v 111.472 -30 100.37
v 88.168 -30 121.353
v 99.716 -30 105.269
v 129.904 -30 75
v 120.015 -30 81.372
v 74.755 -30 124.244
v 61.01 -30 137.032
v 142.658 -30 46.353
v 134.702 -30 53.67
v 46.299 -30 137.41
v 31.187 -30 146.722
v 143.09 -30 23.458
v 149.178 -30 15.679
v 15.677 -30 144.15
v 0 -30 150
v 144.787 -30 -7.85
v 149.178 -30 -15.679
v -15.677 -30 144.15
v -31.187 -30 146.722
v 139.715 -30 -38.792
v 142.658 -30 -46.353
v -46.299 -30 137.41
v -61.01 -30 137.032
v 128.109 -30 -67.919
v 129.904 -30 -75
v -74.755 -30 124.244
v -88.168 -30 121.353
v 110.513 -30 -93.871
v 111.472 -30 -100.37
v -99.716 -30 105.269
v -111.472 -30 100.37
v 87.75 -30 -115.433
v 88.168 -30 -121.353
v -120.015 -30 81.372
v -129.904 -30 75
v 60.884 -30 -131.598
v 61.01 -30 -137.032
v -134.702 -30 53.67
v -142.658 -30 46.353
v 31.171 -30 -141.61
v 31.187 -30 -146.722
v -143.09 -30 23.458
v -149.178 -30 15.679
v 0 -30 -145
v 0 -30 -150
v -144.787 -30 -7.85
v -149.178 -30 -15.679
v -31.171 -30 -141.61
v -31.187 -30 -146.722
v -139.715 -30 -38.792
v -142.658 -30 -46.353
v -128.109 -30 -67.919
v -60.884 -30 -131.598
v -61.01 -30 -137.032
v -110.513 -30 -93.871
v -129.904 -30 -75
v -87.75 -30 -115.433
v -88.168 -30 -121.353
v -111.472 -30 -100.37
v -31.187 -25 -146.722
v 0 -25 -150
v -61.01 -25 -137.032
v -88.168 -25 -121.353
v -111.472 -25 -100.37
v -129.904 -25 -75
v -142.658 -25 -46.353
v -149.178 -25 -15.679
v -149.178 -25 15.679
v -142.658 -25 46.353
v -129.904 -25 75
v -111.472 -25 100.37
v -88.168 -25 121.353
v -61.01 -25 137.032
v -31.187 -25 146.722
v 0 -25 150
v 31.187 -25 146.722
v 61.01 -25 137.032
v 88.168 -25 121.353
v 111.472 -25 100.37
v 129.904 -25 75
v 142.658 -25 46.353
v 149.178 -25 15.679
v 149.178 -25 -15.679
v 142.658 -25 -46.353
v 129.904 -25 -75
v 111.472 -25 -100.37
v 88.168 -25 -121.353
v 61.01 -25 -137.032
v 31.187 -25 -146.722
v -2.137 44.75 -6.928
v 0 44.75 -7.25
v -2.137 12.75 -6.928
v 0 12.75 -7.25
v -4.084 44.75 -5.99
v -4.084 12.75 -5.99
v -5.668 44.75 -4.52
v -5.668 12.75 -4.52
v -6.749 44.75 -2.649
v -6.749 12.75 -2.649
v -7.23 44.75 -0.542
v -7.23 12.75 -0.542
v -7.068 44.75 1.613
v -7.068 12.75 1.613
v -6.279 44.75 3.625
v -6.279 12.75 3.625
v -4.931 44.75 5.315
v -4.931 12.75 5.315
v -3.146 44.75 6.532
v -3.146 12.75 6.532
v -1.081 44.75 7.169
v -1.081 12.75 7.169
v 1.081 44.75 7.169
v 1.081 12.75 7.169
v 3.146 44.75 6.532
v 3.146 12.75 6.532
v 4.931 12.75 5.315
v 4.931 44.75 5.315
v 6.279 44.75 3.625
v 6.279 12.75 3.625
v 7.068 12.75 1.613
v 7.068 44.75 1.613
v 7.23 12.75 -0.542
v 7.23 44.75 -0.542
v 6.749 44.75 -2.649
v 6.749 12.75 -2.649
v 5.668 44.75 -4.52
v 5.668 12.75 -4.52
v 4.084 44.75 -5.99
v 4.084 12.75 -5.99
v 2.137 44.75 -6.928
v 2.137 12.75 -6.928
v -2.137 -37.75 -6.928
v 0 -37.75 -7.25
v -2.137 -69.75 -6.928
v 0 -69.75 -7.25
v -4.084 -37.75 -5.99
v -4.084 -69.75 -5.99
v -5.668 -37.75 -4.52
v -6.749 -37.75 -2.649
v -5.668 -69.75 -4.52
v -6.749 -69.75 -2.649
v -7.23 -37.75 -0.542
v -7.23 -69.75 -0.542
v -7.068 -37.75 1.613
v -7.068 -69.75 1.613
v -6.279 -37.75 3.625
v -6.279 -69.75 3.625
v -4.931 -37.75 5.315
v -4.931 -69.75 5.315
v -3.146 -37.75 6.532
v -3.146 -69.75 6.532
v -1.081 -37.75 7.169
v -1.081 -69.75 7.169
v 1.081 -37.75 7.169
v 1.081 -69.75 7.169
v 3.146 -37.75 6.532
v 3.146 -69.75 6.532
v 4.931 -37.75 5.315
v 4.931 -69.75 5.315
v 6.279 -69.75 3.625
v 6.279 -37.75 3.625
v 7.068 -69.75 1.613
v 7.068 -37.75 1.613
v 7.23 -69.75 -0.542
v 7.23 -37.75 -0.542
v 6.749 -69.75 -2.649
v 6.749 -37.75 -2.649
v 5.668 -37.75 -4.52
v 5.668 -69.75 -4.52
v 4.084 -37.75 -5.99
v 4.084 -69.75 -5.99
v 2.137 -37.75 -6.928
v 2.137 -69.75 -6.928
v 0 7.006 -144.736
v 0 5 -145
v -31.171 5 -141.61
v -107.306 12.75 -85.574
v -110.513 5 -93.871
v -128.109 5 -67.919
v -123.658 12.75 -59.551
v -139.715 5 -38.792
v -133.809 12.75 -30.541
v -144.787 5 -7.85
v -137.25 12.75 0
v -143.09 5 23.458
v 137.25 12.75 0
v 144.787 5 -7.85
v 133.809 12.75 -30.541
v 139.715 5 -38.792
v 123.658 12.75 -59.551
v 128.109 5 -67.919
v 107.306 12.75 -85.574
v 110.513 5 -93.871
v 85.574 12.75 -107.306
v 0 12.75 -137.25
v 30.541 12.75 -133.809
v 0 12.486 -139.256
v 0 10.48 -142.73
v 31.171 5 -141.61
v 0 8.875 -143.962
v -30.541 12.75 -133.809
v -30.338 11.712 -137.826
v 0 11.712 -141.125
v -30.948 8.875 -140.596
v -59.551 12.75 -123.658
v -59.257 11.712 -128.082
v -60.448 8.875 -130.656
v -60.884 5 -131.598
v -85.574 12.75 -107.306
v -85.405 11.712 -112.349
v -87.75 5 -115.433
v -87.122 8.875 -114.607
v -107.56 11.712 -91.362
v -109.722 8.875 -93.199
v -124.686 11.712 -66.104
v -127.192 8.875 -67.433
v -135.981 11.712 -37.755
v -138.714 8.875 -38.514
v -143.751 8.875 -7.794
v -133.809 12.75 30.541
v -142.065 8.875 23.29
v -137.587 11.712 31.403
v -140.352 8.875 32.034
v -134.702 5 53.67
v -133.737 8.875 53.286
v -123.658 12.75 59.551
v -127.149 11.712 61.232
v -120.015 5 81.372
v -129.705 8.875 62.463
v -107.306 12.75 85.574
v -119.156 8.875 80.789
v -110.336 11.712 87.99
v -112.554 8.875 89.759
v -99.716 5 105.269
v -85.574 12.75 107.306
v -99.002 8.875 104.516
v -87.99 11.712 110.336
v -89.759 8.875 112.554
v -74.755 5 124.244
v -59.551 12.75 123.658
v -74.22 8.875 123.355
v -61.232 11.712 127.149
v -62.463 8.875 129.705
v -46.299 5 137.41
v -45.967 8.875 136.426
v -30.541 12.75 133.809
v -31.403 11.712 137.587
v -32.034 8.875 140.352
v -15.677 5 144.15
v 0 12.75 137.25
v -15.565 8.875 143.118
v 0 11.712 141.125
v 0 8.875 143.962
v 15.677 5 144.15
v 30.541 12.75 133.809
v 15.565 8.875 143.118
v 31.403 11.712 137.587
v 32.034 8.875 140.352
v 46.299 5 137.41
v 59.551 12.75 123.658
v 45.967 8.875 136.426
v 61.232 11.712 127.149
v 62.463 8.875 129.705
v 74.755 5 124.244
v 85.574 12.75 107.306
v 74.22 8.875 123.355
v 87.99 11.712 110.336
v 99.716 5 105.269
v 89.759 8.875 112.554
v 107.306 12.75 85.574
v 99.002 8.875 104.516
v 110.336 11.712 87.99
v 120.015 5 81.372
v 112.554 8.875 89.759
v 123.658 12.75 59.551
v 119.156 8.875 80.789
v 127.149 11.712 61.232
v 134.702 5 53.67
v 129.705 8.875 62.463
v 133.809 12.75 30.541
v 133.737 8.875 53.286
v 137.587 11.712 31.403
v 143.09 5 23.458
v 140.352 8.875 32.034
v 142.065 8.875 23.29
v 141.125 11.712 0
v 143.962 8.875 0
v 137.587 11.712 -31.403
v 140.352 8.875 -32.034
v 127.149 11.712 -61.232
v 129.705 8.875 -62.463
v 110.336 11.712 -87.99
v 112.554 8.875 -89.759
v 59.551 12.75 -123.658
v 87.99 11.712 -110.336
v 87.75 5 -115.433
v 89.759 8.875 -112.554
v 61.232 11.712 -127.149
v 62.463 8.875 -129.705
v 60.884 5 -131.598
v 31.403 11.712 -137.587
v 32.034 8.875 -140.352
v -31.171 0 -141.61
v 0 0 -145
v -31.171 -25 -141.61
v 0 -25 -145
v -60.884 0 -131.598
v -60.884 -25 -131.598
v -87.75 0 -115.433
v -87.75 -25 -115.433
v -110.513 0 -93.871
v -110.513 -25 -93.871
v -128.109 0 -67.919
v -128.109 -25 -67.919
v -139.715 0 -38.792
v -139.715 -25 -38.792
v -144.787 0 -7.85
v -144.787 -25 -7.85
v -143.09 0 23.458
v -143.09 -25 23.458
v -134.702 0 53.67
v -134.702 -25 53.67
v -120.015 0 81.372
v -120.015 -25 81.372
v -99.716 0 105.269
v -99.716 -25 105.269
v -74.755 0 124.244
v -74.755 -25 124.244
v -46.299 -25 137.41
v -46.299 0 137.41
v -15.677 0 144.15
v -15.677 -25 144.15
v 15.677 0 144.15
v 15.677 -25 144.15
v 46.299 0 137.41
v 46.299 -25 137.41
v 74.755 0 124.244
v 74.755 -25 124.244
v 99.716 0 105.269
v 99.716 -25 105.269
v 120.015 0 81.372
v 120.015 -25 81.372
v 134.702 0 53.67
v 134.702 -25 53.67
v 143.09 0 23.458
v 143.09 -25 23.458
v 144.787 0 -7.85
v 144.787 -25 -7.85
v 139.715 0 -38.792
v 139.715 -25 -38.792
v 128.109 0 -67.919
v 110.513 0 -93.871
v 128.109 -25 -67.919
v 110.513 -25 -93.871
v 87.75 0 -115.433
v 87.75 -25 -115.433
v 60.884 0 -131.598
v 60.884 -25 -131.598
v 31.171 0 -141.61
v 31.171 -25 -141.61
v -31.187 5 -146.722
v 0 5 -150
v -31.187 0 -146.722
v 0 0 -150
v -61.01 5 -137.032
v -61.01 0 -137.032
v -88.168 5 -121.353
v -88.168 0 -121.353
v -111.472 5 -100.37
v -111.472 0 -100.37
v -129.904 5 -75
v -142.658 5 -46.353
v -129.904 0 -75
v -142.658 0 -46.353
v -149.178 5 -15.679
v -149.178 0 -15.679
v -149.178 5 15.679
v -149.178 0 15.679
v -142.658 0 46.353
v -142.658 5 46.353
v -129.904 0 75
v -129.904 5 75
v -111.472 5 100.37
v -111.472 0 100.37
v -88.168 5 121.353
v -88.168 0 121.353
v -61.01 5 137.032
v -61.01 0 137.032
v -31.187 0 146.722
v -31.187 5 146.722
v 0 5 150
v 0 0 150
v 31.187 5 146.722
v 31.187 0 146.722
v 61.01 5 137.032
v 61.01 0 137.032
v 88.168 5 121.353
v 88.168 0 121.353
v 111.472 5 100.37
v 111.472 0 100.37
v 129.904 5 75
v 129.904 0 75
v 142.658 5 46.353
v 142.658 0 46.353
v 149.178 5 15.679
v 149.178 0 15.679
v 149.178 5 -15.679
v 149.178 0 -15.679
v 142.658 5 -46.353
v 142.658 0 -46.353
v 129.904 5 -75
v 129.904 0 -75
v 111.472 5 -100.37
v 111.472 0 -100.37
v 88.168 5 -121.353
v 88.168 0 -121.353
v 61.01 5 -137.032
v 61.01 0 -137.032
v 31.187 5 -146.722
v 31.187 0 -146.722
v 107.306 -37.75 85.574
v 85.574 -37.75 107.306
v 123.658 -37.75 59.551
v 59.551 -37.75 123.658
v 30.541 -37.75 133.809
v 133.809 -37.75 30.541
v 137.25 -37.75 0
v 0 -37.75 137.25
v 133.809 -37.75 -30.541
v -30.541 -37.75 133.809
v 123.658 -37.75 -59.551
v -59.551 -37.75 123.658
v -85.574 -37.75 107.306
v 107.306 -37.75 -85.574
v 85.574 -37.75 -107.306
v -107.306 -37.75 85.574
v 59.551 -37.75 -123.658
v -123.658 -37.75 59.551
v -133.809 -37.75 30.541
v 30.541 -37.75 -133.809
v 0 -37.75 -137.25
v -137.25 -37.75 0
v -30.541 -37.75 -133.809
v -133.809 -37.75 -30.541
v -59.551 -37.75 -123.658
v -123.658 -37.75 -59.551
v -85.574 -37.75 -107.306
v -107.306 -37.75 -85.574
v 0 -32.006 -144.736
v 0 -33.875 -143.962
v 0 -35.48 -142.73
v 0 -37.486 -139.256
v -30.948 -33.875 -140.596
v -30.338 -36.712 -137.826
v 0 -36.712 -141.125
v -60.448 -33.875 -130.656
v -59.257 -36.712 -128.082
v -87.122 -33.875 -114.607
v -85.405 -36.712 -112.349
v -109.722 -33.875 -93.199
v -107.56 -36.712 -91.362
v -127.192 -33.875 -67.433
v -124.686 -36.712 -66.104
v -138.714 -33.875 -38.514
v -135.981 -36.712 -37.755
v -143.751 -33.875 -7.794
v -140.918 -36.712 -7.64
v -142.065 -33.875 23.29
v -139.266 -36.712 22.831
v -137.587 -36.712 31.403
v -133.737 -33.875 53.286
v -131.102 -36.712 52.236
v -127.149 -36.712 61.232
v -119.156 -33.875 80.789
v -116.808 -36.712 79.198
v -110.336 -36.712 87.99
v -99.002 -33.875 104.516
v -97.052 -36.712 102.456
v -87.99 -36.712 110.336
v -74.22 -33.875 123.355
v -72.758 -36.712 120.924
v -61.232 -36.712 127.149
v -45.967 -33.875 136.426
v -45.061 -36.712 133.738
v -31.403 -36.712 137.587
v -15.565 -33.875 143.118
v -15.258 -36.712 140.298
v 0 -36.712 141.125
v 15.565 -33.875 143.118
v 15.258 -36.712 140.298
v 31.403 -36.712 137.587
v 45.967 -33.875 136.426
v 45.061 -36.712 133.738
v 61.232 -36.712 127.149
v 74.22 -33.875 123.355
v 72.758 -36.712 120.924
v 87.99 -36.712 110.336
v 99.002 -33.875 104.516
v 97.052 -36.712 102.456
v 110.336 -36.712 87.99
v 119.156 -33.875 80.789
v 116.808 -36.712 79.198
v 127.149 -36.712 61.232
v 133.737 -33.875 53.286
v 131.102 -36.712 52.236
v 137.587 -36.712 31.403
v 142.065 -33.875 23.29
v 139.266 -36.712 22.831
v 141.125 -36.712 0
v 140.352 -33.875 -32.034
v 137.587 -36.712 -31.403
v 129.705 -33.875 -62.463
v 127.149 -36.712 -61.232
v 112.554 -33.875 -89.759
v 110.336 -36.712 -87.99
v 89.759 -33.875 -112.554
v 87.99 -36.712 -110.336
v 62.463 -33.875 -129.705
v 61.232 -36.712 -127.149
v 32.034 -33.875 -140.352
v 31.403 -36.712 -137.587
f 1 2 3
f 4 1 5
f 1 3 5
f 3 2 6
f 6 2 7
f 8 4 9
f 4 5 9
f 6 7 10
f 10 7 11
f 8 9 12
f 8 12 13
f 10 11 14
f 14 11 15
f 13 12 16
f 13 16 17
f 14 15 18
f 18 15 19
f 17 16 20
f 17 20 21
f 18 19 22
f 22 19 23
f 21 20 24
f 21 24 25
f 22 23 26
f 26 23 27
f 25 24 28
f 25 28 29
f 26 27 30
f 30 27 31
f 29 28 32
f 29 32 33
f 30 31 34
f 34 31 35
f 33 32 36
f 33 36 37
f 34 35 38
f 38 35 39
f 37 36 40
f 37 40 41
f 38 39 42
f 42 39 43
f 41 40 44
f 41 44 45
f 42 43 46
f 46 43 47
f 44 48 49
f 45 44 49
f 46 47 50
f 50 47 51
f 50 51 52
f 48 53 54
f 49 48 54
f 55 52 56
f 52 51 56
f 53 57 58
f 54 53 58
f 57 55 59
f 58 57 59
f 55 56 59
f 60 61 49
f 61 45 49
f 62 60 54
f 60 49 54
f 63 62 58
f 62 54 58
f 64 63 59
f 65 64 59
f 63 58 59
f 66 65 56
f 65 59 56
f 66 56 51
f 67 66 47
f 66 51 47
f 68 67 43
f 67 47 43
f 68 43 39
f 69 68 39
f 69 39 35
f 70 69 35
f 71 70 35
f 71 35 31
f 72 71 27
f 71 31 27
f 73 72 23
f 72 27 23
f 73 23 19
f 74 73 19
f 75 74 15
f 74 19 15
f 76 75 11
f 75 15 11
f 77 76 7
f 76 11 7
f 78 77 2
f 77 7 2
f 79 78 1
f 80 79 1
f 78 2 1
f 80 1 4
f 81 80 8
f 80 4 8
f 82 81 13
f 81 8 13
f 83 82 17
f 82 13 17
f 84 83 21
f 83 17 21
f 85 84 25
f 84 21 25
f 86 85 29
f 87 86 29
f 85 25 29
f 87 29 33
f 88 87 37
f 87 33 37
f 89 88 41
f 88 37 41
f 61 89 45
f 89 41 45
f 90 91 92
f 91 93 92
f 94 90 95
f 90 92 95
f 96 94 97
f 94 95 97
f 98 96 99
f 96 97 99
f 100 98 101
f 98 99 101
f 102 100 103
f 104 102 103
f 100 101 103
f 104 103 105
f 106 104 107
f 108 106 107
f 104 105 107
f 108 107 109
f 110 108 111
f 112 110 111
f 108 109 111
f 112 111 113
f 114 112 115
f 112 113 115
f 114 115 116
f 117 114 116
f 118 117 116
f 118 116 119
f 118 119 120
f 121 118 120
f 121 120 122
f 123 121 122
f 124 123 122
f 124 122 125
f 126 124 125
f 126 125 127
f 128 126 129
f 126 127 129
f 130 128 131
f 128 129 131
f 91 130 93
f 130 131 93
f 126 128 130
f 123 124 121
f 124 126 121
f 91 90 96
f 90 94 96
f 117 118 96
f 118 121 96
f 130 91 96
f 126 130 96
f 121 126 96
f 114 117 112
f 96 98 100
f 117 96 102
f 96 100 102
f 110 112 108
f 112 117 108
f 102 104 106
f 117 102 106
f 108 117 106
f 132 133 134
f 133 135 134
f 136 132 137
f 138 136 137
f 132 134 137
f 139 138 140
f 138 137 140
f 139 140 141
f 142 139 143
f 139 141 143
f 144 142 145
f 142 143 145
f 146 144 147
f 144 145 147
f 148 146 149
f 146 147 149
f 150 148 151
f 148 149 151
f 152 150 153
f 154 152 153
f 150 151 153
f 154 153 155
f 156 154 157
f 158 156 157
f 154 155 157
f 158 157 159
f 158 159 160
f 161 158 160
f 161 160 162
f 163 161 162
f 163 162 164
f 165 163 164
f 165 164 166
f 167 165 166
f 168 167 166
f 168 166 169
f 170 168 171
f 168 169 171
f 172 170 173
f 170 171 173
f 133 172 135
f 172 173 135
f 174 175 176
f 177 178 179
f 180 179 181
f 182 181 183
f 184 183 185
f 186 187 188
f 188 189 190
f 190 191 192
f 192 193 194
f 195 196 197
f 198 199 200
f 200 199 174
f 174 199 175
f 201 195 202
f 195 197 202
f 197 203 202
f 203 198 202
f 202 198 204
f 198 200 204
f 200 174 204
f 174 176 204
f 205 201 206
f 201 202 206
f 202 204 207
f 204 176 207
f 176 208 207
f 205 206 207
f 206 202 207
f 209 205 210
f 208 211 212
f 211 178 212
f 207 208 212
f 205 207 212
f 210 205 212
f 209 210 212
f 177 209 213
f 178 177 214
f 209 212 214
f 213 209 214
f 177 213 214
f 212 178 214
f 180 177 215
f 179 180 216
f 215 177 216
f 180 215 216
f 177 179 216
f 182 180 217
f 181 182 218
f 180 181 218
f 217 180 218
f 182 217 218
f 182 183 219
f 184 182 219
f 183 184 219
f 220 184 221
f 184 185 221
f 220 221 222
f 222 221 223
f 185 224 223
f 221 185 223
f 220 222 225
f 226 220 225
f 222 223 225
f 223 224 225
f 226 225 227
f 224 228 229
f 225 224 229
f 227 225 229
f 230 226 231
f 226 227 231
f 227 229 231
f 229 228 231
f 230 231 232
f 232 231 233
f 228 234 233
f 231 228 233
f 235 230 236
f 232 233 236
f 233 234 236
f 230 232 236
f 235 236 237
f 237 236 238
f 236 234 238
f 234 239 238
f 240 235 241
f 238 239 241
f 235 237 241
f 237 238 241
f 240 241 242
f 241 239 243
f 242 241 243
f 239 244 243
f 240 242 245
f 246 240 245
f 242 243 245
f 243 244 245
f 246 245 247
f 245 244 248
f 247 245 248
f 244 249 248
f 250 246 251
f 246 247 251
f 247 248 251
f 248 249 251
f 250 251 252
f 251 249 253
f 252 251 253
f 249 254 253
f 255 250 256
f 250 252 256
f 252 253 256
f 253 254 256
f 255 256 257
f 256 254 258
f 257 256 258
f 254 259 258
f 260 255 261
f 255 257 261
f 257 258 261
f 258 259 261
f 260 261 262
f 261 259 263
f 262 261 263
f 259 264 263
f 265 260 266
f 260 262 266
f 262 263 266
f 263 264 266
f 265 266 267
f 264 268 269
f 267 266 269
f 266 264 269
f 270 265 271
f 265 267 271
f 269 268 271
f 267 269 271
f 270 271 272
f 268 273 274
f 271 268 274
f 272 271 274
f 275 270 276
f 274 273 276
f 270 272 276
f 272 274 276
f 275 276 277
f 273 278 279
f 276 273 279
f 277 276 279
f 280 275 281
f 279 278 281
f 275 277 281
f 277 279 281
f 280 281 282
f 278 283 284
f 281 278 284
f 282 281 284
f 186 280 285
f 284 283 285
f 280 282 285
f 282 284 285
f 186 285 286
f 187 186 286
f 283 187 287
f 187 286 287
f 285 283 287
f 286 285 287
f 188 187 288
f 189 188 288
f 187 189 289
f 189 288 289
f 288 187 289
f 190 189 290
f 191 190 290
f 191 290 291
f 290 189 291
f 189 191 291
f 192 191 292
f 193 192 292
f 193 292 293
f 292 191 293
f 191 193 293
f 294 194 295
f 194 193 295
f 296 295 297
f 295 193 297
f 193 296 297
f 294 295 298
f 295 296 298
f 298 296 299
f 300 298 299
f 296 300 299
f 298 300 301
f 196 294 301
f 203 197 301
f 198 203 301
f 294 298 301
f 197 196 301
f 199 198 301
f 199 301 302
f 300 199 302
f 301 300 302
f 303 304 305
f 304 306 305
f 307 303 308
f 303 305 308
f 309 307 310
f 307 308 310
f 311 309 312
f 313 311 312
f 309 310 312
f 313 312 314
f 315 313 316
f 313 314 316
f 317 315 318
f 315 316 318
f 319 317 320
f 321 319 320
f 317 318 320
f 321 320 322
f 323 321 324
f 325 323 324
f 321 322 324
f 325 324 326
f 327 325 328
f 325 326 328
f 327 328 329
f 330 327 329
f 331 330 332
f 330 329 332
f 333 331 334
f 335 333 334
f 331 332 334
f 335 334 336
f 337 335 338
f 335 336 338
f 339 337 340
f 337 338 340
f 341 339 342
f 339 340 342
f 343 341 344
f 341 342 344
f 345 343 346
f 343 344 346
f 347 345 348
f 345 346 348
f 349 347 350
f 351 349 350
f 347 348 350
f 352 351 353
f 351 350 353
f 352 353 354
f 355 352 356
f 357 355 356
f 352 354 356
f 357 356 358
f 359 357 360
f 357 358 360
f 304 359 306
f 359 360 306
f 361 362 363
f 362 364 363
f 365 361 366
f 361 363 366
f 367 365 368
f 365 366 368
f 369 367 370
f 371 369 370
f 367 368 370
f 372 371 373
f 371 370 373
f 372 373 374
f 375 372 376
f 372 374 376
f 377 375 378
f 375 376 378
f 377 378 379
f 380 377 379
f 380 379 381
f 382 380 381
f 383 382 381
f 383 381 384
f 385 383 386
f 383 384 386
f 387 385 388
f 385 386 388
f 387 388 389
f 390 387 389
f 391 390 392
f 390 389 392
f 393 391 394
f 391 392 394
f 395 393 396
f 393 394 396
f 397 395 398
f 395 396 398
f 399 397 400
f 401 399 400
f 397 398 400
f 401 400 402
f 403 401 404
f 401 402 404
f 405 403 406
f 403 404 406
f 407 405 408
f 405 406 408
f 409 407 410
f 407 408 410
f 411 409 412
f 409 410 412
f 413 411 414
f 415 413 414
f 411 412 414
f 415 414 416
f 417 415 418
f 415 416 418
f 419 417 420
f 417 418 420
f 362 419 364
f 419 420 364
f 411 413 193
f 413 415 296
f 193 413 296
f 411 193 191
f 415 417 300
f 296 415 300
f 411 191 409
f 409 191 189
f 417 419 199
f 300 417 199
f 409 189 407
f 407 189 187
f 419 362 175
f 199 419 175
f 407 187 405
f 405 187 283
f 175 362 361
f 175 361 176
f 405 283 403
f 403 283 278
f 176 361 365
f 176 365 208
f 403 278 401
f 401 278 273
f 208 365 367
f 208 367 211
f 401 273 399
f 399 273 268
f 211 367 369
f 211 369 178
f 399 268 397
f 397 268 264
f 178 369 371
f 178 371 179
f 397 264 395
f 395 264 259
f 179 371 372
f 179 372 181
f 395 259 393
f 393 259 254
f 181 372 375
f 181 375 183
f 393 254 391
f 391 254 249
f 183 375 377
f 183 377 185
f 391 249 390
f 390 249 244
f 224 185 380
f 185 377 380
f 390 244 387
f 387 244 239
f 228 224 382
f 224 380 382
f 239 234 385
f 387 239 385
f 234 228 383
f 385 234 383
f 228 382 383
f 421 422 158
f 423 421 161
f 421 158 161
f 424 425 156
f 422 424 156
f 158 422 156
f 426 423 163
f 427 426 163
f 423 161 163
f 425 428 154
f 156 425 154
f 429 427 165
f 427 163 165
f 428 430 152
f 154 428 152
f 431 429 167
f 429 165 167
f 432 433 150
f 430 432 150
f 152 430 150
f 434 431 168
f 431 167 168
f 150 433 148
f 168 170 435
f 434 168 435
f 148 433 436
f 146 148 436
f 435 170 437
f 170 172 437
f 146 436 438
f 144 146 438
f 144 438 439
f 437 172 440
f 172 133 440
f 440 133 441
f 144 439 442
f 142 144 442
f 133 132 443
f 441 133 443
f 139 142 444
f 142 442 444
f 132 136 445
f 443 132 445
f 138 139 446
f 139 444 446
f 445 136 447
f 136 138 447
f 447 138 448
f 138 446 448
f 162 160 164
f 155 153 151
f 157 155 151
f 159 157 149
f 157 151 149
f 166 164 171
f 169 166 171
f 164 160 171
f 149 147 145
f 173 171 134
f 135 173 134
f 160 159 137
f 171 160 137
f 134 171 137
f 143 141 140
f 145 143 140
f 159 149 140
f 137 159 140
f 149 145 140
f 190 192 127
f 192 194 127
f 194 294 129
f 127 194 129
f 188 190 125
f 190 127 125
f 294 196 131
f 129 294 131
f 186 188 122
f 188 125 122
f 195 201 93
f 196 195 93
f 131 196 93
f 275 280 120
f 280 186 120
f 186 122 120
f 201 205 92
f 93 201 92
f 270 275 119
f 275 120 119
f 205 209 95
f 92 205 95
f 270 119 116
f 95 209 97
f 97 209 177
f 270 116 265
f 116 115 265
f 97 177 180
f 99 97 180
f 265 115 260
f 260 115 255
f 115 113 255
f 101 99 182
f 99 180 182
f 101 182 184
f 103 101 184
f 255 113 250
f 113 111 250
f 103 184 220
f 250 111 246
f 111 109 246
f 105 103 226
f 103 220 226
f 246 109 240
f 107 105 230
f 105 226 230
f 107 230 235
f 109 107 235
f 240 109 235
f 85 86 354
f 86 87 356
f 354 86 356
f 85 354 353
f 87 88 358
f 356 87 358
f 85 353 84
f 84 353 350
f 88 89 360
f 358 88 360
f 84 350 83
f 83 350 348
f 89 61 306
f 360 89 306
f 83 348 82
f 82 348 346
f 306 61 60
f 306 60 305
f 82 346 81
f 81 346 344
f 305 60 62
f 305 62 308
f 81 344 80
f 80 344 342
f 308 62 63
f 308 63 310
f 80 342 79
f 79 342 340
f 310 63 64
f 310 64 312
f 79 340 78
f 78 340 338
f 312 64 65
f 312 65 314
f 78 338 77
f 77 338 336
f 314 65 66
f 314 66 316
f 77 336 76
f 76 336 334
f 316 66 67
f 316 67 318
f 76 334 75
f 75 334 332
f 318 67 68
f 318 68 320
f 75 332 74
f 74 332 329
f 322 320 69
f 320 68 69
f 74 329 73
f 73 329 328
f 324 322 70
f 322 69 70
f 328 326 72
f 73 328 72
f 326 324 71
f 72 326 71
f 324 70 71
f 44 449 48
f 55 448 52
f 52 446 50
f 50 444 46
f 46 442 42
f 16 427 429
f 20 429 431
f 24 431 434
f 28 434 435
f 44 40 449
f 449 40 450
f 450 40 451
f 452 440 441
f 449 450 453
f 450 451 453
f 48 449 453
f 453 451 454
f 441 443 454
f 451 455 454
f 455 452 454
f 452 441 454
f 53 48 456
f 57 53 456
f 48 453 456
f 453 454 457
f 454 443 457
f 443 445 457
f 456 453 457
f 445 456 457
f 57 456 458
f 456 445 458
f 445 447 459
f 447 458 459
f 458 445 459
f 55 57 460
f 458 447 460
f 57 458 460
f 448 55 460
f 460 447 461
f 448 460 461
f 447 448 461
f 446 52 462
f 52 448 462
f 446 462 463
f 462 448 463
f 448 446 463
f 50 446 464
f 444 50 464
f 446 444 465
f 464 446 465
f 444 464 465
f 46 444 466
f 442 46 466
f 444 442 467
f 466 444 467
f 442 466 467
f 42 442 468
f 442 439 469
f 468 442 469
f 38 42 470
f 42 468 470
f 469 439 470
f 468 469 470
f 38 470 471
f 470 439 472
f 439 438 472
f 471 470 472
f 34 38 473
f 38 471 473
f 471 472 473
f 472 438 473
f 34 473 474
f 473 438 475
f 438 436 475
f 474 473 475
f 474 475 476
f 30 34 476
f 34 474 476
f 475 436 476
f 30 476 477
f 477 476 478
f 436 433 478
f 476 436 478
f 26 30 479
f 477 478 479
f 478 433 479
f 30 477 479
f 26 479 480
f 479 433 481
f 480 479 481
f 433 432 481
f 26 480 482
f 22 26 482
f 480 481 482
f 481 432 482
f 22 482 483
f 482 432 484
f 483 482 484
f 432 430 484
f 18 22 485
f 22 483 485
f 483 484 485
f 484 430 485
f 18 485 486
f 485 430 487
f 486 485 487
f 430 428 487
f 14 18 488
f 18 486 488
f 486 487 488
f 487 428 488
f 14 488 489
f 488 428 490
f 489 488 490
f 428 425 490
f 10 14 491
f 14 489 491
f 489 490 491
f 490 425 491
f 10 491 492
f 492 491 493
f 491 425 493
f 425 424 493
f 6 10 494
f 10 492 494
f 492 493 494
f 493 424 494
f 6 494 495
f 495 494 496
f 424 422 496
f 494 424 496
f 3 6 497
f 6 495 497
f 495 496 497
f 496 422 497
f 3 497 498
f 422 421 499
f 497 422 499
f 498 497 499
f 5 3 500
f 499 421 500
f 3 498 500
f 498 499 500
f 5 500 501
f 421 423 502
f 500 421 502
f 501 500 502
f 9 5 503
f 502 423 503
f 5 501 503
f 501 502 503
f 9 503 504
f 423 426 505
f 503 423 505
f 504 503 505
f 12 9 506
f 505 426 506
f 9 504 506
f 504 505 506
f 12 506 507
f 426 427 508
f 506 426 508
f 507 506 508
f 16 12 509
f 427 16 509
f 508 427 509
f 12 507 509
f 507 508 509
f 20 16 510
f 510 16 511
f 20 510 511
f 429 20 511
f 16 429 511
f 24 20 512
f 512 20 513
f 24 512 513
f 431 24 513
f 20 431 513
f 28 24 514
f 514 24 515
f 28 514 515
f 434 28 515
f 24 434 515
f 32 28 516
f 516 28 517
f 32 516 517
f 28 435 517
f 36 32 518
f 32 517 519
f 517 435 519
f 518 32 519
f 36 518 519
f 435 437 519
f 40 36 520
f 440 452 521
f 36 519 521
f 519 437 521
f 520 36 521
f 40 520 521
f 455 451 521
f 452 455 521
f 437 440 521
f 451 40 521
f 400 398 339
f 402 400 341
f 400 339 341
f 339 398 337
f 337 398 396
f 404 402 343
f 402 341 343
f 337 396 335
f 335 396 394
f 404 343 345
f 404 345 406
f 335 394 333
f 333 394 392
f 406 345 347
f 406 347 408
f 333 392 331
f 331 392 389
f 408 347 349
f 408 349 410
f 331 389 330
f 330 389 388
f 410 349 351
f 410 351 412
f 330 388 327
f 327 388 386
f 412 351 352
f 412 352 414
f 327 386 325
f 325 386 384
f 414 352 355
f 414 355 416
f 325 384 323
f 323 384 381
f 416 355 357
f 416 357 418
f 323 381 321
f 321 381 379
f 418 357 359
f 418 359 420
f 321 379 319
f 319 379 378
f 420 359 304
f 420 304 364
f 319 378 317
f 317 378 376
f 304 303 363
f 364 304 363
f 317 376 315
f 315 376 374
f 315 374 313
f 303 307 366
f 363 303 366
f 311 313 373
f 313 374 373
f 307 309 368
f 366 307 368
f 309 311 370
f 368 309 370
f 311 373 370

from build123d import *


with BuildPart() as part:
    # Sketch3 → Revolve1 (revolve)
    with BuildSketch(Plane(origin=(0, 0, 0), x_dir=(0, 0, -1), z_dir=(1, 0, 0)), mode=Mode.PRIVATE) as revolve1_sk:
        with BuildLine():
            Line((-7.25, 44.75), (-7.25, 12.75))
            Line((-7.25, 12.75), (-137.25, 12.75))
            ThreePointArc((-137.25, 12.75), (-142.730077554, 10.480077554), (-145, 5))
            Line((-145, 5), (-150, 5))
            Line((-150, 5), (-150, 0))
            Line((-150, 0), (-145, 0))
            Line((-145, 0), (-145, -25))
            Line((-145, -25), (-150, -25))
            Line((-150, -25), (-150, -30))
            Line((-150, -30), (-145, -30))
            ThreePointArc((-145, -30), (-142.730077554, -35.480077554), (-137.25, -37.75))
            Line((-137.25, -37.75), (-7.25, -37.75))
            Line((-7.25, -37.75), (-7.25, -69.75))
            Line((-7.25, -69.75), (0, -69.75))
            Line((0, -69.75), (0, 44.75))
            Line((0, 44.75), (-7.25, 44.75))
        make_face()
    revolve(revolve1_sk.sketch.rotate(Axis((0, -69.75, 0), (0, 1, 0)), 180), axis=Axis((0, -69.75, 0), (0, 1, 0)))


solid = part.part
